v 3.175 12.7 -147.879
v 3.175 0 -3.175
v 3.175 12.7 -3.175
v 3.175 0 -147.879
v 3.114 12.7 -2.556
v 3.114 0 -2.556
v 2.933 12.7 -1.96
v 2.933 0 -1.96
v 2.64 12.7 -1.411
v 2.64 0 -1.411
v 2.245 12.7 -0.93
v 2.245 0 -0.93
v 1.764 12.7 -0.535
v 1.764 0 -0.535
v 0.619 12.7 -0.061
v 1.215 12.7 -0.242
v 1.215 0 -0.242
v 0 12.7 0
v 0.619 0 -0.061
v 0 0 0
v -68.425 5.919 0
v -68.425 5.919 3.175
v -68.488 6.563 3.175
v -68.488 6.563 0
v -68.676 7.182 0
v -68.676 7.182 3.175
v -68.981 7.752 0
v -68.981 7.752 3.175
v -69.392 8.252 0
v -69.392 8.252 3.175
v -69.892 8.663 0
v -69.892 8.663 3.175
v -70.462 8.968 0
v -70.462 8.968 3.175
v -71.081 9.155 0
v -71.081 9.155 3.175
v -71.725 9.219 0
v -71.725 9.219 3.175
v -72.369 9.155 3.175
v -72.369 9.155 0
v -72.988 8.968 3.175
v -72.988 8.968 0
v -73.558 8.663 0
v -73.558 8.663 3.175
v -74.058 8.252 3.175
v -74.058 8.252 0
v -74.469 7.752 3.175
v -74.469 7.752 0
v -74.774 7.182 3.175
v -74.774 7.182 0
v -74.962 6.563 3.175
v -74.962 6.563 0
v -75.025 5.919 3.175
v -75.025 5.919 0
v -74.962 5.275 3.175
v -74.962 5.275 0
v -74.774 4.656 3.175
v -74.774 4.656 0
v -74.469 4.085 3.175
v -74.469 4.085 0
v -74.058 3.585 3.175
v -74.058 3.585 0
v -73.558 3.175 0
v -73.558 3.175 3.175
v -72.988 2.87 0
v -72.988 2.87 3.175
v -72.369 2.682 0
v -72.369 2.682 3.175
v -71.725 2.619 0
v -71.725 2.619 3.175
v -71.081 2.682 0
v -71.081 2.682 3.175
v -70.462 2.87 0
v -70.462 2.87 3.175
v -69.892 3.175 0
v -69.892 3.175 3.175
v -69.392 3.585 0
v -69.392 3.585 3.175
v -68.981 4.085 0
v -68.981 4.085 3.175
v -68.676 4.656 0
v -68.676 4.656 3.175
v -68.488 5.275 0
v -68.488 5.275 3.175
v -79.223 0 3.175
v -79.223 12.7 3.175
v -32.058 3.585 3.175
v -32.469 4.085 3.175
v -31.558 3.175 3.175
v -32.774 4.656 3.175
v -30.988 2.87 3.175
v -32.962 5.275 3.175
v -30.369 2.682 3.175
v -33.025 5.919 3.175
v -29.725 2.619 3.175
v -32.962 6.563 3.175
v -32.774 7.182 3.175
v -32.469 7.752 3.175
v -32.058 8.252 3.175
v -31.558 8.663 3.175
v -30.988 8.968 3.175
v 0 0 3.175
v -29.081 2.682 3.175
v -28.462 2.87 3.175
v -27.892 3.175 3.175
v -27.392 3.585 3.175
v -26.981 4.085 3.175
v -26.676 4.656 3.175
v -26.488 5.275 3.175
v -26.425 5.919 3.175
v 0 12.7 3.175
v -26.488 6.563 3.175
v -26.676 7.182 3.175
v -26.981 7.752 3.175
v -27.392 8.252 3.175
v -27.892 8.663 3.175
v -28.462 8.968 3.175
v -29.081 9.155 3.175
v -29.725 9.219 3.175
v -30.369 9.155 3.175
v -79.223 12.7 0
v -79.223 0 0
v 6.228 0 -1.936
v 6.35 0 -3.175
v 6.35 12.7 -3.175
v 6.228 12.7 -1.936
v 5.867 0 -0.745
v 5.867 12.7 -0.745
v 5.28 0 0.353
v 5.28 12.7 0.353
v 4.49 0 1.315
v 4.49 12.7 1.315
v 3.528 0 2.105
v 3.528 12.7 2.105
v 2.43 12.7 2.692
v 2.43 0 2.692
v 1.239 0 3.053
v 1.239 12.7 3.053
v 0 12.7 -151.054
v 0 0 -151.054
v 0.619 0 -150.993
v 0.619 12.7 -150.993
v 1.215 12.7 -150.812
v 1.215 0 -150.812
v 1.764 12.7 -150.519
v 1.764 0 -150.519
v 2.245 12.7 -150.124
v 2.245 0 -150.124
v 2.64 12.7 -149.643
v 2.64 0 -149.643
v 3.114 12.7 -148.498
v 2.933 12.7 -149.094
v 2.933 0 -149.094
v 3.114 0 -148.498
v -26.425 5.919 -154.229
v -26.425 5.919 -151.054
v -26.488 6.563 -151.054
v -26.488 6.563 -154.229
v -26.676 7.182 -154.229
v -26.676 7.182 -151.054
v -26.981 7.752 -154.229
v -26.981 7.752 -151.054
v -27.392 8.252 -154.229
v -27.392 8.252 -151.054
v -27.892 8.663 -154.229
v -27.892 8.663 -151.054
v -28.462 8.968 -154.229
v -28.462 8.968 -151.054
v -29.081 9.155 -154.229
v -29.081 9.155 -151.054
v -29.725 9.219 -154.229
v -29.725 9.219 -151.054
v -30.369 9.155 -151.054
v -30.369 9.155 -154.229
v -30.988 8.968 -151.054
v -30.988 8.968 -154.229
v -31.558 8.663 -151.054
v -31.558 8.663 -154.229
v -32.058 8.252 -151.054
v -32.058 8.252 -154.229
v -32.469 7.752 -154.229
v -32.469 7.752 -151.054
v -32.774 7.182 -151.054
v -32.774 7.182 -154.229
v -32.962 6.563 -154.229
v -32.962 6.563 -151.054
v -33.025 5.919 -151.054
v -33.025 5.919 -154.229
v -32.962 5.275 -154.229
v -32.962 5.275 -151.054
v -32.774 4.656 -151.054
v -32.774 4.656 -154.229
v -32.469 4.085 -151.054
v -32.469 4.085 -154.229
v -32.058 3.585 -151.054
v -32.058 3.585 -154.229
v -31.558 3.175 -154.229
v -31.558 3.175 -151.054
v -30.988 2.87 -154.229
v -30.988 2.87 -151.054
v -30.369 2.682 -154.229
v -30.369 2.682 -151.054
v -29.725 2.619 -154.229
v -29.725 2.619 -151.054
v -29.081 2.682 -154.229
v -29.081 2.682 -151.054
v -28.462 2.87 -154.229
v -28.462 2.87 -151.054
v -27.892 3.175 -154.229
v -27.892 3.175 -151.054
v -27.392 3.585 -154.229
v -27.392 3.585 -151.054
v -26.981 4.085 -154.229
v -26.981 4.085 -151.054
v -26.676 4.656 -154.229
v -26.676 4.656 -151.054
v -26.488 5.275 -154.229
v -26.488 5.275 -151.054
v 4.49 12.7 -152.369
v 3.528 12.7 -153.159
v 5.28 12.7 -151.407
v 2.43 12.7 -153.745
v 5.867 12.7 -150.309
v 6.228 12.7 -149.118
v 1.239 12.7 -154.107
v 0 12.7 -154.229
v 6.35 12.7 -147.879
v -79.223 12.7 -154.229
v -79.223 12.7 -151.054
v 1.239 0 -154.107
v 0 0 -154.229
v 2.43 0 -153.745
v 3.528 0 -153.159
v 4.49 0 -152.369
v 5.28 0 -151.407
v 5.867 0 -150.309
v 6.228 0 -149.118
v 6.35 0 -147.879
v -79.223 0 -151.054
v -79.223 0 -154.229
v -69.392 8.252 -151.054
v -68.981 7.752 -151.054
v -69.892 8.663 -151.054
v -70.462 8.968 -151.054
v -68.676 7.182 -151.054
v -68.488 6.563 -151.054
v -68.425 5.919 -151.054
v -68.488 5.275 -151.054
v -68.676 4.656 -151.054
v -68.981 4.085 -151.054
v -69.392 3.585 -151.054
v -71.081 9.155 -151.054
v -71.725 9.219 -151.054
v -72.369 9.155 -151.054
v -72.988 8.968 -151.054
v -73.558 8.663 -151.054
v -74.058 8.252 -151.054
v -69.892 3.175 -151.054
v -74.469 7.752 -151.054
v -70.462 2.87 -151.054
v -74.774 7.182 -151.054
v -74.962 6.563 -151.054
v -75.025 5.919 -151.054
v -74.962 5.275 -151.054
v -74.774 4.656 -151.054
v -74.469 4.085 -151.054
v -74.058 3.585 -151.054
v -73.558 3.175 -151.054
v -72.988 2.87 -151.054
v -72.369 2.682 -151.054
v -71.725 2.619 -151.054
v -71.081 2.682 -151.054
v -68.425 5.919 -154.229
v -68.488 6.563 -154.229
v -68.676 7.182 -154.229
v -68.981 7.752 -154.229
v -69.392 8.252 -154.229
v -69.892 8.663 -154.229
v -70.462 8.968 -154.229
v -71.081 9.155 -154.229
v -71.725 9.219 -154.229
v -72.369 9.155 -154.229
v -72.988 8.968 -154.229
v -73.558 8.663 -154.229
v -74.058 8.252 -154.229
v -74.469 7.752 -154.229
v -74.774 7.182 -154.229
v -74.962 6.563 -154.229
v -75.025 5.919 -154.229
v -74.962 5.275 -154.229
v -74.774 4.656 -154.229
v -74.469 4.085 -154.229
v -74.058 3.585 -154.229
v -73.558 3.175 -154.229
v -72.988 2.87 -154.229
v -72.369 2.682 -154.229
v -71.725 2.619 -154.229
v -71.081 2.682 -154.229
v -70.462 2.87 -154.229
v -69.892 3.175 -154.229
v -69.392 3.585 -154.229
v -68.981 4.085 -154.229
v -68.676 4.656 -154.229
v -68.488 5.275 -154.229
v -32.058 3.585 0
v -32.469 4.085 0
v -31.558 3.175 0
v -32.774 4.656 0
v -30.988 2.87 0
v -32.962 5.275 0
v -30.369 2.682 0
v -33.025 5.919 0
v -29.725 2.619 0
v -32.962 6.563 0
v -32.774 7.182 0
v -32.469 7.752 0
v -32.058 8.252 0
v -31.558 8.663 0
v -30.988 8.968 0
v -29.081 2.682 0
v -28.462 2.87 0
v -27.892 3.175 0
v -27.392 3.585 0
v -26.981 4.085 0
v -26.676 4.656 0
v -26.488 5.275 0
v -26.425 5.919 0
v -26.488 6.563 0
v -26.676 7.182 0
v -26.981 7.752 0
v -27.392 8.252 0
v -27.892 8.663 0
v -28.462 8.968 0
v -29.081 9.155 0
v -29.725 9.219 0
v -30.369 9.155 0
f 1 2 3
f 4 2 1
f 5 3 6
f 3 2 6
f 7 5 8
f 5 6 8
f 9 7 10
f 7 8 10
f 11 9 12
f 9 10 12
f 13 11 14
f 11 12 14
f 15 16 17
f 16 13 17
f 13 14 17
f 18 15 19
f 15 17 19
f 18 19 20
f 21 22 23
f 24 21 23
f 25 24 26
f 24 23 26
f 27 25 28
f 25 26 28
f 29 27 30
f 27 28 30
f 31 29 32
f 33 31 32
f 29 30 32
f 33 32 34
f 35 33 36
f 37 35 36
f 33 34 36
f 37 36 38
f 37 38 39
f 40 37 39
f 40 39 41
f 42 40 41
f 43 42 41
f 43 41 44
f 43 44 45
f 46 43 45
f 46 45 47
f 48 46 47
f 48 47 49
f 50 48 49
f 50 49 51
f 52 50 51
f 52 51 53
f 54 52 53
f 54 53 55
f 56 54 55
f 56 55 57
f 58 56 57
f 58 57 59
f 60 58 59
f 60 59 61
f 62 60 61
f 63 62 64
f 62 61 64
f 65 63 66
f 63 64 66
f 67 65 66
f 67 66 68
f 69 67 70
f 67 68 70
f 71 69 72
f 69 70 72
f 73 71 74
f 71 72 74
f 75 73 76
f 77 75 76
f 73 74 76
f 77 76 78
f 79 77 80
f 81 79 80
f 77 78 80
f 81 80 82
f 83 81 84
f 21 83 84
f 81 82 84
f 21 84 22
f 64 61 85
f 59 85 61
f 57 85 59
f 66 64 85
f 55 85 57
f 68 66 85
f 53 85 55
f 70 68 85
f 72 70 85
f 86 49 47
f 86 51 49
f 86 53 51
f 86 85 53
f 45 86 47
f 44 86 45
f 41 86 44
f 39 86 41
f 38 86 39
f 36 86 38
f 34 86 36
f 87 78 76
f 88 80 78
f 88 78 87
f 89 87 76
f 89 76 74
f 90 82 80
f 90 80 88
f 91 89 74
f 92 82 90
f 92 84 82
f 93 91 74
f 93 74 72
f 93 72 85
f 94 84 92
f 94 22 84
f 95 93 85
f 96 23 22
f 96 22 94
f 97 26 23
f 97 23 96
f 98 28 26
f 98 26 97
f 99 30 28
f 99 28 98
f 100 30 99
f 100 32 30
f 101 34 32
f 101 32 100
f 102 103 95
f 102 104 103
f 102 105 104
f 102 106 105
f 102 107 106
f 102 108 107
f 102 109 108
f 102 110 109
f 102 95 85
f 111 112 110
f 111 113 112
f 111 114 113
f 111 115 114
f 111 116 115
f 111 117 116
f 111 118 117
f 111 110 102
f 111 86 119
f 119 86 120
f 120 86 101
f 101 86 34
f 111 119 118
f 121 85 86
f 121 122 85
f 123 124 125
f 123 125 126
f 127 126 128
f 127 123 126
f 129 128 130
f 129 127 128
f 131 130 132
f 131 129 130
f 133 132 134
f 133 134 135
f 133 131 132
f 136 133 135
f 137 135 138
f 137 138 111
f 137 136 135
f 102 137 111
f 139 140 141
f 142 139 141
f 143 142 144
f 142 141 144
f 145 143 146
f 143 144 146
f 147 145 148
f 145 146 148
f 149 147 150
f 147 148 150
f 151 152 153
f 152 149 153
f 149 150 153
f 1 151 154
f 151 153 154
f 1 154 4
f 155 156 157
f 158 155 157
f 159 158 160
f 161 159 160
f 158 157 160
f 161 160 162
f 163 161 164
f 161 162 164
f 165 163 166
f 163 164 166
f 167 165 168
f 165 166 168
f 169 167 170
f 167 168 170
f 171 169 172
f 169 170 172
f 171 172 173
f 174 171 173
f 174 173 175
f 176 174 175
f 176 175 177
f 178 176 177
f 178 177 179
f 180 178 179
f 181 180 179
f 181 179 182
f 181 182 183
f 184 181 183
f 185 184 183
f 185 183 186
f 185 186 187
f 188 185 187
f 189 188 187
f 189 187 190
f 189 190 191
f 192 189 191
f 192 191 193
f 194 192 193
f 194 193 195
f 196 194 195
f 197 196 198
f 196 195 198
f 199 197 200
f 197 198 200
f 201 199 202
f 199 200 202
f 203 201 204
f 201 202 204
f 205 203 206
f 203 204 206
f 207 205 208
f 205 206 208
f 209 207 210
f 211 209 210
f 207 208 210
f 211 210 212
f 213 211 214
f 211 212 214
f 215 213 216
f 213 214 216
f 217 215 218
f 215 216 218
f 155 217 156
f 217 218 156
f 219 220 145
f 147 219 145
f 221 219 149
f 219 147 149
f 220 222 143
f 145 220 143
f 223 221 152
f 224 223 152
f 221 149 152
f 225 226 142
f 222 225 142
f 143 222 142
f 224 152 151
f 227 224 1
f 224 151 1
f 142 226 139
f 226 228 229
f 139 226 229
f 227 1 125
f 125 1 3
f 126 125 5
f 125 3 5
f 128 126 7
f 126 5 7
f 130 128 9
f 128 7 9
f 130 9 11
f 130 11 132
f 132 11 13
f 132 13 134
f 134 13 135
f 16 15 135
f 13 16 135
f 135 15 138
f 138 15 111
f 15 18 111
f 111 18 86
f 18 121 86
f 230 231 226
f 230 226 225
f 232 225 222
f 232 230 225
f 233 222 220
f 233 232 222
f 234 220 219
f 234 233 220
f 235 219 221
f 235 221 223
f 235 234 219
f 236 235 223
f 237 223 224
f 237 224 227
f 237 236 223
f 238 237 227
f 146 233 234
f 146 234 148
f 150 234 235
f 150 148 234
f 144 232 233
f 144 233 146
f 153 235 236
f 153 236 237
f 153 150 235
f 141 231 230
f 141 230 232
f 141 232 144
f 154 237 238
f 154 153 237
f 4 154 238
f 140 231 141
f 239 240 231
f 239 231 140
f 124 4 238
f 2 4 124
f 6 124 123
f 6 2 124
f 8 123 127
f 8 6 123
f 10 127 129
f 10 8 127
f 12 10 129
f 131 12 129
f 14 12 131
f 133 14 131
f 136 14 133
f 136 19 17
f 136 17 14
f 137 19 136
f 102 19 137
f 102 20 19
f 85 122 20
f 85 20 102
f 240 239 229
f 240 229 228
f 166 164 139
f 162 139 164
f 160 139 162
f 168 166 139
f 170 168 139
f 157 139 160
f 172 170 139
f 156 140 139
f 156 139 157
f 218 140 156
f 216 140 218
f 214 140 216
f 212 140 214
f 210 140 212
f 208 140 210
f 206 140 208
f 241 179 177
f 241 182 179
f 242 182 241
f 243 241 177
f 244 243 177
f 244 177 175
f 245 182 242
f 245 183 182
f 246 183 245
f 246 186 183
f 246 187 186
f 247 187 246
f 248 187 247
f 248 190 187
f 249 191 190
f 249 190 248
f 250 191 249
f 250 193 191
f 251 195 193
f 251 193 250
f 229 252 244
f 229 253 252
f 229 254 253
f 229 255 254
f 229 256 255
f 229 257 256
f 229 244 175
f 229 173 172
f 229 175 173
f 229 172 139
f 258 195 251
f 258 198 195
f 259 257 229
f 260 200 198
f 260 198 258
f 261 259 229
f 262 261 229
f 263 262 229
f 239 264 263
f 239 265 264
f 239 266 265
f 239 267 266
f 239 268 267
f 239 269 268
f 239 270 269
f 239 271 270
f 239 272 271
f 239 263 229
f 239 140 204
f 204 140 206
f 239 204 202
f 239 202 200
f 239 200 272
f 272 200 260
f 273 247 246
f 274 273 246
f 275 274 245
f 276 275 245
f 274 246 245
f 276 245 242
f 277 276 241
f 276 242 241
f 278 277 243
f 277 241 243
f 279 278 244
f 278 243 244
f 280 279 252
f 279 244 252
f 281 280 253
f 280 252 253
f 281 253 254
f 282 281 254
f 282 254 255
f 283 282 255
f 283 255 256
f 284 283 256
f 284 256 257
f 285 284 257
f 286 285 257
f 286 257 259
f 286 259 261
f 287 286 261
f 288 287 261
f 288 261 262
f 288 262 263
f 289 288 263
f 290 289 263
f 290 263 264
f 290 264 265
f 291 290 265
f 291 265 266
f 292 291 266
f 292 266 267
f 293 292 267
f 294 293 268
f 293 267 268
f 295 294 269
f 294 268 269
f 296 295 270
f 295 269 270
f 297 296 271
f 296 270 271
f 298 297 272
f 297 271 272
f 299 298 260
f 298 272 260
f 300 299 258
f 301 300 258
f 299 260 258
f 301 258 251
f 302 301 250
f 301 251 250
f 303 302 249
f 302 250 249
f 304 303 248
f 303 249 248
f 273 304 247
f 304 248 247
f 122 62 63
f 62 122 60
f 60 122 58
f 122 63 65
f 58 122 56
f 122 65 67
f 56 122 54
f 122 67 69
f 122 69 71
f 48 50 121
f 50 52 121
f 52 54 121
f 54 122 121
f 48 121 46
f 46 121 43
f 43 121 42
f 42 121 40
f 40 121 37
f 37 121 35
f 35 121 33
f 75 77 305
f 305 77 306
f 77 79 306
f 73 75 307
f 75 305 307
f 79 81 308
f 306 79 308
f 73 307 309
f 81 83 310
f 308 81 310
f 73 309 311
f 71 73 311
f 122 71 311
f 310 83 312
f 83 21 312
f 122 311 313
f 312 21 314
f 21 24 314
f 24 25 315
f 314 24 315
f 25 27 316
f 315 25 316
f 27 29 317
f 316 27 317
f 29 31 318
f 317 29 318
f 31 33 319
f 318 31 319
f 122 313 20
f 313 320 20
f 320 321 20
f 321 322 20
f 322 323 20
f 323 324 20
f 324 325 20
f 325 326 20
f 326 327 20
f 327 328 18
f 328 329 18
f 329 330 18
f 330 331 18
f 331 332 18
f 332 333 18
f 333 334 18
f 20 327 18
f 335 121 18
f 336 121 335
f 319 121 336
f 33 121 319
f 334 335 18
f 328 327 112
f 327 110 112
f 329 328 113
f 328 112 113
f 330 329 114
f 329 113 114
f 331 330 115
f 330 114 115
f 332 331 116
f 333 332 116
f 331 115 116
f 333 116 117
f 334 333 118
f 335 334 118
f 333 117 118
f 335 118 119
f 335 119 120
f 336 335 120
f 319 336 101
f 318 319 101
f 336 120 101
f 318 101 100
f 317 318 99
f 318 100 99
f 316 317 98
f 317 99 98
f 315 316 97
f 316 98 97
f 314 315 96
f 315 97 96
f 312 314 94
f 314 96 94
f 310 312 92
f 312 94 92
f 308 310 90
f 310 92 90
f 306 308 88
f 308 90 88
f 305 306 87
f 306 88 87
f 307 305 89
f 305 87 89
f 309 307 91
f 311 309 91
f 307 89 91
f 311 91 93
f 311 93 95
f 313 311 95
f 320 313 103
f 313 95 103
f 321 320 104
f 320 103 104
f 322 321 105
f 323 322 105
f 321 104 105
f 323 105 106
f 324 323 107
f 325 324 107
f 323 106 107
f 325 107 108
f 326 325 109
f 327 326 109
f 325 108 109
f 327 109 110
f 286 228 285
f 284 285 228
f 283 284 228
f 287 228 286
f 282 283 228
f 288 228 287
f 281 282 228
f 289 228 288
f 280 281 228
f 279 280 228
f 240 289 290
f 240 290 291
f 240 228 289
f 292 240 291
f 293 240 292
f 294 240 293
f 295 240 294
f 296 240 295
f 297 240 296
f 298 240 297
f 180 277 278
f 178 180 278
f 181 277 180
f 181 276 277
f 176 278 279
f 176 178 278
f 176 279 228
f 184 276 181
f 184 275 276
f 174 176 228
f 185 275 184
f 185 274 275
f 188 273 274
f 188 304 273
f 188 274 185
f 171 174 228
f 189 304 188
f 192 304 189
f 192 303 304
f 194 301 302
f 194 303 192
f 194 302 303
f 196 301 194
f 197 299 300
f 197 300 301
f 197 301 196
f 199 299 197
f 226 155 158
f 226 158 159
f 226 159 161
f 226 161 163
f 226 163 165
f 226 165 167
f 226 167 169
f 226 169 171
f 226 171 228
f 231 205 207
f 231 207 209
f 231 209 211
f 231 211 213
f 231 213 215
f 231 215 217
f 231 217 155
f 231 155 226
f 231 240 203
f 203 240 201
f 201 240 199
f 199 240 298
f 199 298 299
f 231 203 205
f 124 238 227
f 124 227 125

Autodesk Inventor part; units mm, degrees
ref_plane "YZ Plane" through (0, 0, 0) normal (1, 0, 0) x (0, 1, 0)
ref_plane "XZ Plane" through (0, 0, 0) normal (0, 1, 0) x (-1, 0, 0)
ref_plane "XY Plane" through (0, 0, 0) normal (0, 0, 1) x (1, 0, 0)
sketch "Sketch1" plane through (0, 0, 0) normal (0, 0, 1) x (1, 0, 0)
  line L0 (0, 0) -> (-79.2226, 0)
  line L1 (-79.2226, 0) -> (-79.2226, 12.7)
  line L2 (-79.2226, 12.7) -> (0, 12.7)
  line L3 (0, 12.7) -> (0, 0)
  line L4 (0, 12.7) -> (-29.718, 12.7)
  line L5 (-79.2226, 12.7) -> (-71.7296, 12.7)
  dimension "d1" = 79.2226
  dimension "d2" = 12.7
  dimension "d5" = 7.493
extrude "Plate5" add sketch "Sketch1" along normal blind 3.175
sketch "Sketch6" plane through (3.175, 0, -3.175) normal (1, 0, 0) x (0, 1, 0)
  line L0 (12.7, 0) -> (0, 0)
  line L1 (0, 0) -> (0, -144.7038)
  line L2 (0, -144.7038) -> (12.7, -144.7038)
  line L3 (12.7, -144.7038) -> (12.7, 0)
edge flange "Flange4" height 151.0538 angle 90 thickness 3.175 bend radius 3.175 thickness toward (1, 0, 0) relief tear relief width 3.175 relief depth 1.5875 edges at (0, 6.35, 0) wall of the first edge with corners at (3.175, 12.7, -3.175) (3.175, 0, -3.175) (3.175, 0, -147.8788) (3.175, 12.7, -147.8788)
bend "Bend4"
corner "Corner4"
sketch "Sketch7" plane through (0, 0, -151.0538) normal (0, 0, -1) x (-1, 0, 0)
  line L0 (0, 12.7) -> (0, 0)
  line L1 (0, 0) -> (79.2226, 0)
  line L2 (79.2226, 0) -> (79.2226, 12.7)
  line L3 (79.2226, 12.7) -> (0, 12.7)
edge flange "Flange5" height 85.5726 angle 90 thickness 3.175 bend radius 3.175 thickness toward (0, 0, -1) relief tear relief width 3.175 relief depth 1.5875 edges at (3.175, 6.35, -147.8788) wall of the first edge with corners at (0, 12.7, -151.0538) (0, 0, -151.0538) (-79.2226, 0, -151.0538) (-79.2226, 12.7, -151.0538)
bend "Bend5"
corner "Corner5"
sketch "Sketch8" plane through (0, 0, 3.175) normal (0, 0, 1) x (1, 0, 0)
  circle A0 centre (-71.725, 5.9188) radius 3.3 projected
  circle A1 centre (-29.725, 5.9188) radius 3.3 projected
extrude "Extrusion2" cut sketch "Sketch8" against normal blind 2539974.6
equation "\"d43\" = BendReliefWidth"
equation "\"d44\" = BendReliefDepth"
equation "\"d45\" = MinimumRemnant"
equation "\"d46\" = BendRadius"
equation "\"d49\" = BendRadius"
equation "\"d50\" = CornerReliefSize"
equation "\"d51\" = GapSize"
equation "\"d52\" = JacobiRadiusSize"
equation "\"d53\" = BendReliefWidth"
equation "\"d54\" = BendReliefDepth"
equation "\"d55\" = MinimumRemnant"
equation "\"d56\" = BendRadius"
equation "\"d59\" = BendRadius"
equation "\"d60\" = CornerReliefSize"
equation "\"d61\" = GapSize"
equation "\"d62\" = JacobiRadiusSize"
equation "\"BendRadius\" = Thickness"
equation "\"BendReliefWidth\" = Thickness"
equation "\"BendReliefDepth\" = 0.5 * Thickness"
equation "\"CornerReliefSize\" = 4 * Thickness"
equation "\"MinimumRemnant\" = 2 * Thickness"
equation "\"TransitionRadius\" = BendRadius"
equation "\"JacobiRadiusSize\" = BendRadius"
equation "\"GapSize\" = Thickness"
equation "\"d8\" = BendRadius"
equation "\"d42\" = BendRadius"
equation "\"Thickness\" = 3.175"
properties part number "tie-together tier 1 wide" material "Aluminum 6061"
